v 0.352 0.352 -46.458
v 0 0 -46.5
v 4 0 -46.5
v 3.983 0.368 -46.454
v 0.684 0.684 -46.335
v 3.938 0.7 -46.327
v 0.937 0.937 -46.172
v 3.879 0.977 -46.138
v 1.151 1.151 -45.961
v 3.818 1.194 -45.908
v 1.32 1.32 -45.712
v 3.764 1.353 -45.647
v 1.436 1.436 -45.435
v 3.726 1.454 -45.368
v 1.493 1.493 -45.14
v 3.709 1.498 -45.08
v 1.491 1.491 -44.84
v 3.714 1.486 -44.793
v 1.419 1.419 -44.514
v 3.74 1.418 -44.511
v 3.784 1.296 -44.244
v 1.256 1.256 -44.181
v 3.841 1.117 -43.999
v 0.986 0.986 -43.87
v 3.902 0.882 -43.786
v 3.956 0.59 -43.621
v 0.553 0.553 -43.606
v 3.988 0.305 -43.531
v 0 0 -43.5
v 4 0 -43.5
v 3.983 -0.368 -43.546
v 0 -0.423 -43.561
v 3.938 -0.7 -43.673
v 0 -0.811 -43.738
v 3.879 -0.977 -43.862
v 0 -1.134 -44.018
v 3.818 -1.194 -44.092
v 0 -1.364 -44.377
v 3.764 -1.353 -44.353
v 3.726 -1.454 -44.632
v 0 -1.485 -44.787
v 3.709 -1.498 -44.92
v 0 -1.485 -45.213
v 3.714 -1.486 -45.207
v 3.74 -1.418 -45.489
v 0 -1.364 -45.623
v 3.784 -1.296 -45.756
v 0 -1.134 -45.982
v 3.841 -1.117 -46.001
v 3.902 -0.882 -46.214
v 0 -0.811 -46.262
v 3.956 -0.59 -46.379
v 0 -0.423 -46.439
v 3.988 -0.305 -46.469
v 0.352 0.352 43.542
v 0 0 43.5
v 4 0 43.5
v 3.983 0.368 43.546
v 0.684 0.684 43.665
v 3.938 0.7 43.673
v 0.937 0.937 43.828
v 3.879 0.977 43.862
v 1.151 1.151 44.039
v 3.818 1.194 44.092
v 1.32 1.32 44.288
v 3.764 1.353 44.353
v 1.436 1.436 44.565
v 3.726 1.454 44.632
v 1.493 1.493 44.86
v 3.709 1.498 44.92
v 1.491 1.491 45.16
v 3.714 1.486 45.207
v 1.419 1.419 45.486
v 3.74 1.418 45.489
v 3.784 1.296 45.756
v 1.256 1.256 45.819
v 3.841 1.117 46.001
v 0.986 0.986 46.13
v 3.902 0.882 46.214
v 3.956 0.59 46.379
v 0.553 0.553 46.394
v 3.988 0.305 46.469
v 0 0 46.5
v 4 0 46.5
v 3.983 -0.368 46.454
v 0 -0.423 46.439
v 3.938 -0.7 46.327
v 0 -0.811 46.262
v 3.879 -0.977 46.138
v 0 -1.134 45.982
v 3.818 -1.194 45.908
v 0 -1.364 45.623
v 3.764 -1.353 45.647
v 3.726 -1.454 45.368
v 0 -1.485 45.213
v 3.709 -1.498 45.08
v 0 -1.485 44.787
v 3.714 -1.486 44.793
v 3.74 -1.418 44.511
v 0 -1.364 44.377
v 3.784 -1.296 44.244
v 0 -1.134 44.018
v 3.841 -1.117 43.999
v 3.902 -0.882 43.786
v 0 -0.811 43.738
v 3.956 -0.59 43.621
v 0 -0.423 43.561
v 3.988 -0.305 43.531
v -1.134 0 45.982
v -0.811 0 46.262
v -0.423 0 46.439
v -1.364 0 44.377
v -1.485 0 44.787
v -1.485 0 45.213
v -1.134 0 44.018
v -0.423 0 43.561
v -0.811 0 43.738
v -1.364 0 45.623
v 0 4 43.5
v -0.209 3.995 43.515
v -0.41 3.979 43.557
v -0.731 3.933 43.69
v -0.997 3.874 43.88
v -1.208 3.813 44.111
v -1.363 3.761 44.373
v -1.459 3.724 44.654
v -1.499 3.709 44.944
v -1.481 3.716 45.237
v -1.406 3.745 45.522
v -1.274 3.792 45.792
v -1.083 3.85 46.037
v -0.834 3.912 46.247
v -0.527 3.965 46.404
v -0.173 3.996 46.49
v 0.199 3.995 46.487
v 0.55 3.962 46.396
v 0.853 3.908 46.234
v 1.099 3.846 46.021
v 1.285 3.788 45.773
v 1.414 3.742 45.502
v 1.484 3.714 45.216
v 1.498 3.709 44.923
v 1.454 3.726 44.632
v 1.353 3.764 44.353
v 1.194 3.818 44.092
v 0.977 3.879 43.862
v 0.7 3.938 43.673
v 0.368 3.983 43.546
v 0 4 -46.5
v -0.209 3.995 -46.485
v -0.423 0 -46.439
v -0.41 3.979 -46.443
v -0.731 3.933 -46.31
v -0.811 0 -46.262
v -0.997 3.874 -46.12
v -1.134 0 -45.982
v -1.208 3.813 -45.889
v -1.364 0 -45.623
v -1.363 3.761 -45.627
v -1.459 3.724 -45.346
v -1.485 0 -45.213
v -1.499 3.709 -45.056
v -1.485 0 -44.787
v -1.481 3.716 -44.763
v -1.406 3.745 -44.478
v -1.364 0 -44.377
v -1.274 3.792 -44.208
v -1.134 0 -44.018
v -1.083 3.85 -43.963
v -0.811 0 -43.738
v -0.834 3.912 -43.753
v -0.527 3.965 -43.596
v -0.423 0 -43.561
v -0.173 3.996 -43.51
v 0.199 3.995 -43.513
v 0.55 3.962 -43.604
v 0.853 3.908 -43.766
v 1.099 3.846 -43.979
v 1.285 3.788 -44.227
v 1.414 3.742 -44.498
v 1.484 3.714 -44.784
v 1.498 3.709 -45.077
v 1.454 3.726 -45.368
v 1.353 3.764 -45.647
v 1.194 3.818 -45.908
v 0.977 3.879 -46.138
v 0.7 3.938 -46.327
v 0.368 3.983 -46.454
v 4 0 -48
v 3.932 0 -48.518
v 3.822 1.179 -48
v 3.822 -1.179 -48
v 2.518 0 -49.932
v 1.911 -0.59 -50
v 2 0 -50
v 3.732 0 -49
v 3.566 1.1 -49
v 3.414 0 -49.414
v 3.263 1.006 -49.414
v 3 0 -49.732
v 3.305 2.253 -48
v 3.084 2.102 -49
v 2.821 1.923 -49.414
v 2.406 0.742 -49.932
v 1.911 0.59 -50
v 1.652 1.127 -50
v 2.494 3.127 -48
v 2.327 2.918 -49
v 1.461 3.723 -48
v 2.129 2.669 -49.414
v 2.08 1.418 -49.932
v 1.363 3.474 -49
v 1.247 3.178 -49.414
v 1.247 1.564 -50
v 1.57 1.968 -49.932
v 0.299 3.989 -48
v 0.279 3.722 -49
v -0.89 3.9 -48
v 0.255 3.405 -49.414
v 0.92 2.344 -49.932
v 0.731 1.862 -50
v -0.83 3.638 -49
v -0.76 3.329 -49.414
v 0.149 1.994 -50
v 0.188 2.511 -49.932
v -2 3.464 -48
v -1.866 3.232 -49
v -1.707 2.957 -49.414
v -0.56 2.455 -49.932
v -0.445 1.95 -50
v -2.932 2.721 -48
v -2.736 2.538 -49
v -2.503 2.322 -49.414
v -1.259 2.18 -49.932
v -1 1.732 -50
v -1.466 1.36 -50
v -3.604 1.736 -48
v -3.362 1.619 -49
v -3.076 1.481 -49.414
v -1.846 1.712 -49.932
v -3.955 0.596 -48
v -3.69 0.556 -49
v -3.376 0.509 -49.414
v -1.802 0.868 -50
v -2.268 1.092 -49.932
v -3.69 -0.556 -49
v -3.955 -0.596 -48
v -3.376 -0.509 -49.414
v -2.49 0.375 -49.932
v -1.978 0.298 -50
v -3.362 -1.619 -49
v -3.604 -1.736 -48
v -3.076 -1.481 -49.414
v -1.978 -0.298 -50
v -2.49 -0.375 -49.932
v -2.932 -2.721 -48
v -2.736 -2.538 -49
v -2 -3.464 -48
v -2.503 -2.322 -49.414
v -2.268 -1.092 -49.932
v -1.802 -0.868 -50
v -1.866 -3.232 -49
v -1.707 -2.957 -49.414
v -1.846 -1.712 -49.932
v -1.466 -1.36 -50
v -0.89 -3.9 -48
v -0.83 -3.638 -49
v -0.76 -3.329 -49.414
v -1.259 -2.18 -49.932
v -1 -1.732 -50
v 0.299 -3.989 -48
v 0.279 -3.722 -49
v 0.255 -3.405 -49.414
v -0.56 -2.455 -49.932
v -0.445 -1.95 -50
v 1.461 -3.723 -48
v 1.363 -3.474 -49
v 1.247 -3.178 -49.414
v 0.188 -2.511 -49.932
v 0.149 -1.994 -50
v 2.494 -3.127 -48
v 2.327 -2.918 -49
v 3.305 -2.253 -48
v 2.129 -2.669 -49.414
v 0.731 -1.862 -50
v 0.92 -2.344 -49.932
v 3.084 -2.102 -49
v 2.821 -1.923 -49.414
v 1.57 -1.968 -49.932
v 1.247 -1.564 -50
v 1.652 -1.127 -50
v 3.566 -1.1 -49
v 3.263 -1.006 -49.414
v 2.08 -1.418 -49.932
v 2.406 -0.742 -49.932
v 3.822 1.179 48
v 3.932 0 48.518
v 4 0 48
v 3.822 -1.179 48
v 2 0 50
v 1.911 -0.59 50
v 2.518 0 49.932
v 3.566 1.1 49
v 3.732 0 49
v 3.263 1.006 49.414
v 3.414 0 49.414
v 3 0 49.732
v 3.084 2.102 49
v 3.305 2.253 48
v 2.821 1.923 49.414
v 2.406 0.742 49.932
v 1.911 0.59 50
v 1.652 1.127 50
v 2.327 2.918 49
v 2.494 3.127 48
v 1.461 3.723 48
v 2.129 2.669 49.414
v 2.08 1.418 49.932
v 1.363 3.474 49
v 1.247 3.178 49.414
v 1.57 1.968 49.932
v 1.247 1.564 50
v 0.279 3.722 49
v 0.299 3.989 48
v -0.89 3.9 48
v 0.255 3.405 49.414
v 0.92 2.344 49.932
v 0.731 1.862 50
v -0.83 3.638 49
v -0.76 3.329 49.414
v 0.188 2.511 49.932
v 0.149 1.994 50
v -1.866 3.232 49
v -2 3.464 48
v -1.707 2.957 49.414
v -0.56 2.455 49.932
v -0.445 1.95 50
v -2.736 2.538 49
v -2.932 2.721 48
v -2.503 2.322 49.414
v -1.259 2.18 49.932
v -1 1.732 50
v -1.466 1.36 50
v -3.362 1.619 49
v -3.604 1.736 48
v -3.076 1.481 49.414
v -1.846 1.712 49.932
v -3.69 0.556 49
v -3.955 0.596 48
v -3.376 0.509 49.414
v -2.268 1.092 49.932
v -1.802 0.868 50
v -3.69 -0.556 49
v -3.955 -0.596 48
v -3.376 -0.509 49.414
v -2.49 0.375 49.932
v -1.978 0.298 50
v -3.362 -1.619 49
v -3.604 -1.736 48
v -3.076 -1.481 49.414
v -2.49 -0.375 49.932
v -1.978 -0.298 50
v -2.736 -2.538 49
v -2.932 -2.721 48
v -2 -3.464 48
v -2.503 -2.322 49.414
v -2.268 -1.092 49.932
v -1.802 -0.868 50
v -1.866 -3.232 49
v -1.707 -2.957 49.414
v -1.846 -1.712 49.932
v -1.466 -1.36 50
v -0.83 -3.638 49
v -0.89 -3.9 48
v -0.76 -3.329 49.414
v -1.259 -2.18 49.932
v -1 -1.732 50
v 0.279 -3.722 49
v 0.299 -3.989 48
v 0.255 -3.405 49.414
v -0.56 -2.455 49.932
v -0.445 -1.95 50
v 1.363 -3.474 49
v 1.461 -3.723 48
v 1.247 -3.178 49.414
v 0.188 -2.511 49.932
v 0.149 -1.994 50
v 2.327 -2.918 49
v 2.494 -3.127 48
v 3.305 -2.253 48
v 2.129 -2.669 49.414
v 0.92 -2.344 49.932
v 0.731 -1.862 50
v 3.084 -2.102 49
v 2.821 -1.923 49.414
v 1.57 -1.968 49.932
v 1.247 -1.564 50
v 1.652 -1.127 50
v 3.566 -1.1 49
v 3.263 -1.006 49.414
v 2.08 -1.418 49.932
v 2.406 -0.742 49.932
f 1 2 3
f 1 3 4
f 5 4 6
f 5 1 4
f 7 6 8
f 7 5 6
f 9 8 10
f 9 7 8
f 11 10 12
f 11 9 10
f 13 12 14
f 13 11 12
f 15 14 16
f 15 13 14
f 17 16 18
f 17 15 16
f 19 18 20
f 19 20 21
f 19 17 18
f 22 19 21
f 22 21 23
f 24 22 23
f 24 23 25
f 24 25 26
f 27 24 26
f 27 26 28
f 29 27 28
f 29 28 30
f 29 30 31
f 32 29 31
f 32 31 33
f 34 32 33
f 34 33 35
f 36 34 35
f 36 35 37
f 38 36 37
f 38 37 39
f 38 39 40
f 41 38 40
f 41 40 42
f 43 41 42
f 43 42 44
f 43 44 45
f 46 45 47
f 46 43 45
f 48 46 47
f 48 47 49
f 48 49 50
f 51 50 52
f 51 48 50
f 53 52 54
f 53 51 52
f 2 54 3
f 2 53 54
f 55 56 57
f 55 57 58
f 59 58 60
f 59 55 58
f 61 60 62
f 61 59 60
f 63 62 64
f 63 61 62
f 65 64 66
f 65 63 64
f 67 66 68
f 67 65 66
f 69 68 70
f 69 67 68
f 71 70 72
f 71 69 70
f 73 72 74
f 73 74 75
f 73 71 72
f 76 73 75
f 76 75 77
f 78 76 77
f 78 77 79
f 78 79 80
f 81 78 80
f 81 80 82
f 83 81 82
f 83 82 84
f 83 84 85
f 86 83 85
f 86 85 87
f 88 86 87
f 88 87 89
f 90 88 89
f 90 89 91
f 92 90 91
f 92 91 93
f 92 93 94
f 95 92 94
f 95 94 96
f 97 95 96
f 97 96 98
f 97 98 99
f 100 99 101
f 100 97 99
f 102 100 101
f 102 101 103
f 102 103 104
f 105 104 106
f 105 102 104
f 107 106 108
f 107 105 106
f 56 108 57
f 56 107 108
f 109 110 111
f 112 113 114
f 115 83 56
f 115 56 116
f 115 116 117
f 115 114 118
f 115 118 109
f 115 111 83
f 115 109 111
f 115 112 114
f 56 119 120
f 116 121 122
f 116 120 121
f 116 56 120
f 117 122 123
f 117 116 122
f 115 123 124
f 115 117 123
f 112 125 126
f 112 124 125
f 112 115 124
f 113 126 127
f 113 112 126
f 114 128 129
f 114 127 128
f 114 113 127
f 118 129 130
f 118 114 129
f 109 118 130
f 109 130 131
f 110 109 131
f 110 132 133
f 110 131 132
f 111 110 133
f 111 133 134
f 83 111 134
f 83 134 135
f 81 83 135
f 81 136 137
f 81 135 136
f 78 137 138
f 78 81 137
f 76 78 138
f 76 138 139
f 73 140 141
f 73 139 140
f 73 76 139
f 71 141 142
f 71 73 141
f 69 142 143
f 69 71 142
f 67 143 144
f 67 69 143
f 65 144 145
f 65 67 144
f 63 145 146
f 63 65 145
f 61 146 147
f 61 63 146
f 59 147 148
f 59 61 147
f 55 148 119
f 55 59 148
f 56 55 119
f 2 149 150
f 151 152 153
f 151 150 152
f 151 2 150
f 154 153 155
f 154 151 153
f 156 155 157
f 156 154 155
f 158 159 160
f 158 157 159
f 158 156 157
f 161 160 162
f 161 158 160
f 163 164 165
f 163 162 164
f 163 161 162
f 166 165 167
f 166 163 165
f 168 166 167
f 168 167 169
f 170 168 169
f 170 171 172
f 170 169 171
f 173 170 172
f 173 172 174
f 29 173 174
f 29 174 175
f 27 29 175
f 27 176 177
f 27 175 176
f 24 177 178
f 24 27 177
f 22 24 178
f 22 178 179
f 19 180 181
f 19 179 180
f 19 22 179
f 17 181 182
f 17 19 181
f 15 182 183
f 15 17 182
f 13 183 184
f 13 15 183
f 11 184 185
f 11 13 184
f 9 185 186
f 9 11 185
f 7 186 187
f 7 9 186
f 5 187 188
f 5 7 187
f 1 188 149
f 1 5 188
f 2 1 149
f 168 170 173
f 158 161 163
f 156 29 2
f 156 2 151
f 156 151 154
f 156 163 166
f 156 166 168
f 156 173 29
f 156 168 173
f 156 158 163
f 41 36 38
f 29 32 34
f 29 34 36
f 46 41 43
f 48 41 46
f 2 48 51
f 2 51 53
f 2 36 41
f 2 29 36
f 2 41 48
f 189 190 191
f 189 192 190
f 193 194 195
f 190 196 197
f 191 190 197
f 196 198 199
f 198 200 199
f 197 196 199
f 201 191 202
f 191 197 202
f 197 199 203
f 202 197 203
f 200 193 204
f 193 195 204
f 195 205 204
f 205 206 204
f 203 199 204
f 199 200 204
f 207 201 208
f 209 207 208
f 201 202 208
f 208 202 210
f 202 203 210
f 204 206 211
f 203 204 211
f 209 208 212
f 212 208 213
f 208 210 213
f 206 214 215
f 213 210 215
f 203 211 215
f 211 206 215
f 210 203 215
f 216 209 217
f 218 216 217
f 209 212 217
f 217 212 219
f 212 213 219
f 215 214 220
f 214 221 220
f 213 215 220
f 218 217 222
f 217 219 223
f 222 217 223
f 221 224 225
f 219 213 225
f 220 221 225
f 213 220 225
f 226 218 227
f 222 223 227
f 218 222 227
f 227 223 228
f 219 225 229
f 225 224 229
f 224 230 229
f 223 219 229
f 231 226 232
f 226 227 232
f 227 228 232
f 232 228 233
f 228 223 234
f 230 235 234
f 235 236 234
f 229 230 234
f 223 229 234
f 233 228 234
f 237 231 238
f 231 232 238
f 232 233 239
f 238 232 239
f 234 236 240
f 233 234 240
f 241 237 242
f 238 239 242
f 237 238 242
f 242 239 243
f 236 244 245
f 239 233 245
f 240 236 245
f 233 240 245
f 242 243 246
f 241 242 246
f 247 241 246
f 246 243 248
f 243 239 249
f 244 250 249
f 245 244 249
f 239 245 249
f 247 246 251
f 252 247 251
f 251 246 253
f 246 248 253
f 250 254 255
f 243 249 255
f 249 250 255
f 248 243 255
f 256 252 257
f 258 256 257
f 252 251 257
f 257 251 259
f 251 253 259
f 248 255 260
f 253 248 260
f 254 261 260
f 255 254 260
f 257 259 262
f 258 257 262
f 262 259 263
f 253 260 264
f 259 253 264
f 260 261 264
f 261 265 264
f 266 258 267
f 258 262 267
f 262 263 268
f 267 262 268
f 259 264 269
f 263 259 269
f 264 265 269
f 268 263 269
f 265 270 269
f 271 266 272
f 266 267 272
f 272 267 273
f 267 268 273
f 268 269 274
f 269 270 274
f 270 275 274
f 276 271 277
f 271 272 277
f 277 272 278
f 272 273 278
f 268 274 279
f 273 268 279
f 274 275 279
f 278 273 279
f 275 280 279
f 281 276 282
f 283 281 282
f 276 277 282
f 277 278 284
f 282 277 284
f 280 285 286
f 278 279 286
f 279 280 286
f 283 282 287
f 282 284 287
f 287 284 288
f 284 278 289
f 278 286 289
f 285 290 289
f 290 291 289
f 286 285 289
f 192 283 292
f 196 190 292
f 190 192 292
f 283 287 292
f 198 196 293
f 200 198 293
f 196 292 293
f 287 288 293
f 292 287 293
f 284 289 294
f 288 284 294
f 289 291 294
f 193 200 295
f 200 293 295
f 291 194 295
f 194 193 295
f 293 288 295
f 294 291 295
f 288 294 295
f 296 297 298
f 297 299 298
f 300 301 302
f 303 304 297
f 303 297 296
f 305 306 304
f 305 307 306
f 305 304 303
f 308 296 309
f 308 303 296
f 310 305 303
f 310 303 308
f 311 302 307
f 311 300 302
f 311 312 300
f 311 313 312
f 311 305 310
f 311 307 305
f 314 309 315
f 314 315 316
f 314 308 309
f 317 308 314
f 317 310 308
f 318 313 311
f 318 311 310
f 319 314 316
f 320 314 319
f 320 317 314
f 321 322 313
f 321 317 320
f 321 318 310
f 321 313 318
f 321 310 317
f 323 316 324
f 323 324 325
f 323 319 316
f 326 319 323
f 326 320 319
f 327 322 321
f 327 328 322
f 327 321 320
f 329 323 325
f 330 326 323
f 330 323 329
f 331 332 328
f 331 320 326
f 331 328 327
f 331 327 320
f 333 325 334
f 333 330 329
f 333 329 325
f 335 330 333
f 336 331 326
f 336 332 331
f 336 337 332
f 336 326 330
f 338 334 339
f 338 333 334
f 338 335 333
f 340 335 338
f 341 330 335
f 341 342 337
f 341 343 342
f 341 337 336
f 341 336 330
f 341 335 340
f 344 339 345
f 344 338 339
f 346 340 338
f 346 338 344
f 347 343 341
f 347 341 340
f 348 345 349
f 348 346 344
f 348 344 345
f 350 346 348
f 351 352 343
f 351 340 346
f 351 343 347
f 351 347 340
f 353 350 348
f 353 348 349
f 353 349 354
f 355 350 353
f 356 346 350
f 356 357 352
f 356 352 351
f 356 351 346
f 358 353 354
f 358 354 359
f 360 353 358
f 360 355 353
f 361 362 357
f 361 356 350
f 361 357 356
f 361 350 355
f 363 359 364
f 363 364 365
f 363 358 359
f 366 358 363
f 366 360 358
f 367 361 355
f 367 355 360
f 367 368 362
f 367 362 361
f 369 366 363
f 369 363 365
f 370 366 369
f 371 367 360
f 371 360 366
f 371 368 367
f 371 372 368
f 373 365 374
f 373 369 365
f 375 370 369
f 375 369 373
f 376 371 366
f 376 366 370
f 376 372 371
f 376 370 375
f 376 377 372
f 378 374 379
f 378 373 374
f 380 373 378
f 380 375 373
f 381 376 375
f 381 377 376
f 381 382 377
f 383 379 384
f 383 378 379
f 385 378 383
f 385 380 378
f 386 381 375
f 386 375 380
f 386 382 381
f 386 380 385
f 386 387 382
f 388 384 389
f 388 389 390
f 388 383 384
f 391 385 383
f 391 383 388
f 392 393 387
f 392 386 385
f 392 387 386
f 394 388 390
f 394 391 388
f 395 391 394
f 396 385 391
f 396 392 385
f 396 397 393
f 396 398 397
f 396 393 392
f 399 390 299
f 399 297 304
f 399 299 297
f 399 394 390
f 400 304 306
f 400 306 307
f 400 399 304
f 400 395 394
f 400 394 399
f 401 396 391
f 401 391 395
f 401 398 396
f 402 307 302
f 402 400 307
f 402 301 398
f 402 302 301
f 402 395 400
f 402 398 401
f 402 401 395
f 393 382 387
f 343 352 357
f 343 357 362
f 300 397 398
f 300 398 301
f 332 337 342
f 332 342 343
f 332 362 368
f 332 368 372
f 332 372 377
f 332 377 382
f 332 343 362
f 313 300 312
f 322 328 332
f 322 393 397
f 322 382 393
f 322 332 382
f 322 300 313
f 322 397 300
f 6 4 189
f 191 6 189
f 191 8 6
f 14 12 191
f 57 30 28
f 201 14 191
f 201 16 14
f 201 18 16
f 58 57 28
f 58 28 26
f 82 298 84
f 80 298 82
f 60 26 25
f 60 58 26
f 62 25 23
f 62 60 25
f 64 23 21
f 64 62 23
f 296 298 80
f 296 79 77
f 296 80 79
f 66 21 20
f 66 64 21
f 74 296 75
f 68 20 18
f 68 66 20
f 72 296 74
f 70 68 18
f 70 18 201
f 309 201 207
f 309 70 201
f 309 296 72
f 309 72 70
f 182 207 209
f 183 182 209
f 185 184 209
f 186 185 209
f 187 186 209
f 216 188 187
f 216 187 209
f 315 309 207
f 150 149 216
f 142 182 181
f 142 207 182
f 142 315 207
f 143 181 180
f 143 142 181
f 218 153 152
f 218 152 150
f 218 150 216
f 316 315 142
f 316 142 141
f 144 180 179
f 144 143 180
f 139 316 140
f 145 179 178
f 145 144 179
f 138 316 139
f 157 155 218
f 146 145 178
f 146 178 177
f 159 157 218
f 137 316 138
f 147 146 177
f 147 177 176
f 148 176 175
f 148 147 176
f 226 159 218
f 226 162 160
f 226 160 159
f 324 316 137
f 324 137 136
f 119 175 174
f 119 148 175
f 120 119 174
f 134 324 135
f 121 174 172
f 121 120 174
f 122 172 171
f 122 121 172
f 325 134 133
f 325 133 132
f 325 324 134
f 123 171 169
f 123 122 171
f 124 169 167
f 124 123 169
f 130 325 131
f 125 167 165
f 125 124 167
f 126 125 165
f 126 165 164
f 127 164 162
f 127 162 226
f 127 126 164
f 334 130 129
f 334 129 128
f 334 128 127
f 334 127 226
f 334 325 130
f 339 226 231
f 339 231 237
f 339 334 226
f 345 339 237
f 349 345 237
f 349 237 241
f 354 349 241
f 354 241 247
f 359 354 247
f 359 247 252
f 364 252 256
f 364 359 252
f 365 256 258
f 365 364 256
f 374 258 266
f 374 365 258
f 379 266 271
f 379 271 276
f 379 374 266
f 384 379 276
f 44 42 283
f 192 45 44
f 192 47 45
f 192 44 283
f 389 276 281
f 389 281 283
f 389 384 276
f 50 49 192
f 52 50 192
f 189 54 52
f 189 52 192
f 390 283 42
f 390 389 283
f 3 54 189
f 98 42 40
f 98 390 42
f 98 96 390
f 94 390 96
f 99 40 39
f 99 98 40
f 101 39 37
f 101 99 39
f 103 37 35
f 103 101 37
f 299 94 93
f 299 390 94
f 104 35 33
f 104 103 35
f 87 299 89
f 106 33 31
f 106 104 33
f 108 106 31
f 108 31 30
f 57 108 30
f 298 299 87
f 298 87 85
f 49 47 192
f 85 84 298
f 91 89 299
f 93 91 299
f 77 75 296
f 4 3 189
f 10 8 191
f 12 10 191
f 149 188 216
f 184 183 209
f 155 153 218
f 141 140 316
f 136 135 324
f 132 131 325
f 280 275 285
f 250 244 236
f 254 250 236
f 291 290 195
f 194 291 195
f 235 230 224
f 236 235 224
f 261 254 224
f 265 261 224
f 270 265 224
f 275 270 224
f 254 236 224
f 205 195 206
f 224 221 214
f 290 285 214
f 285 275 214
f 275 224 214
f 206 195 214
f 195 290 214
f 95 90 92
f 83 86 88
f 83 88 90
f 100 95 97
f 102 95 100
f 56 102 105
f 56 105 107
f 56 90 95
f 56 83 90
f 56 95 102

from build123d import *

# Parameters (mm, degrees)
SKETCH1_R           = 4
BOSS_EXTRUDE1_DEPTH = 50
SKETCH2_R           = 1.5
CUT_EXTRUDE1_DEPTH  = 5
FILLET1_R           = 2
SKETCH3_R           = 1.5
CUT_EXTRUDE2_DEPTH  = 4


with BuildPart() as part:
    # Sketch1 → Boss-Extrude1 (new, symmetric)
    with BuildSketch(Plane.XY):
        Circle(SKETCH1_R)
    extrude(amount=BOSS_EXTRUDE1_DEPTH, both=True)

    # Sketch2 → Cut-Extrude1 (cut)
    with BuildSketch(Plane(origin=(0, 0, 0), x_dir=(0, 0, -1), z_dir=(1, 0, 0))):
        with Locations((-45, 0)):
            Circle(SKETCH2_R)
        with Locations((45, 0)):
            Circle(SKETCH2_R)
    extrude(amount=CUT_EXTRUDE1_DEPTH, mode=Mode.SUBTRACT)

    # Fillet1
    fillet1_edges = [part.edges().sort_by_distance(p)[0] for p in [
        (-4, 0, -50),
        (-4, 0, 50),
    ]]
    fillet(fillet1_edges, radius=FILLET1_R)

    # Sketch3 → Cut-Extrude2 (cut)
    with BuildSketch(Plane(origin=(0, 0, 0), x_dir=(1, 0, 0), z_dir=(0, 1, 0))):
        with Locations(Location((0, 45, 0), (0, 0, 90))):
            Circle(SKETCH3_R)
        with Locations(Location((0, -45, 0), (0, 0, 90))):
            Circle(SKETCH3_R)
    extrude(amount=CUT_EXTRUDE2_DEPTH, mode=Mode.SUBTRACT)


solid = part.part
